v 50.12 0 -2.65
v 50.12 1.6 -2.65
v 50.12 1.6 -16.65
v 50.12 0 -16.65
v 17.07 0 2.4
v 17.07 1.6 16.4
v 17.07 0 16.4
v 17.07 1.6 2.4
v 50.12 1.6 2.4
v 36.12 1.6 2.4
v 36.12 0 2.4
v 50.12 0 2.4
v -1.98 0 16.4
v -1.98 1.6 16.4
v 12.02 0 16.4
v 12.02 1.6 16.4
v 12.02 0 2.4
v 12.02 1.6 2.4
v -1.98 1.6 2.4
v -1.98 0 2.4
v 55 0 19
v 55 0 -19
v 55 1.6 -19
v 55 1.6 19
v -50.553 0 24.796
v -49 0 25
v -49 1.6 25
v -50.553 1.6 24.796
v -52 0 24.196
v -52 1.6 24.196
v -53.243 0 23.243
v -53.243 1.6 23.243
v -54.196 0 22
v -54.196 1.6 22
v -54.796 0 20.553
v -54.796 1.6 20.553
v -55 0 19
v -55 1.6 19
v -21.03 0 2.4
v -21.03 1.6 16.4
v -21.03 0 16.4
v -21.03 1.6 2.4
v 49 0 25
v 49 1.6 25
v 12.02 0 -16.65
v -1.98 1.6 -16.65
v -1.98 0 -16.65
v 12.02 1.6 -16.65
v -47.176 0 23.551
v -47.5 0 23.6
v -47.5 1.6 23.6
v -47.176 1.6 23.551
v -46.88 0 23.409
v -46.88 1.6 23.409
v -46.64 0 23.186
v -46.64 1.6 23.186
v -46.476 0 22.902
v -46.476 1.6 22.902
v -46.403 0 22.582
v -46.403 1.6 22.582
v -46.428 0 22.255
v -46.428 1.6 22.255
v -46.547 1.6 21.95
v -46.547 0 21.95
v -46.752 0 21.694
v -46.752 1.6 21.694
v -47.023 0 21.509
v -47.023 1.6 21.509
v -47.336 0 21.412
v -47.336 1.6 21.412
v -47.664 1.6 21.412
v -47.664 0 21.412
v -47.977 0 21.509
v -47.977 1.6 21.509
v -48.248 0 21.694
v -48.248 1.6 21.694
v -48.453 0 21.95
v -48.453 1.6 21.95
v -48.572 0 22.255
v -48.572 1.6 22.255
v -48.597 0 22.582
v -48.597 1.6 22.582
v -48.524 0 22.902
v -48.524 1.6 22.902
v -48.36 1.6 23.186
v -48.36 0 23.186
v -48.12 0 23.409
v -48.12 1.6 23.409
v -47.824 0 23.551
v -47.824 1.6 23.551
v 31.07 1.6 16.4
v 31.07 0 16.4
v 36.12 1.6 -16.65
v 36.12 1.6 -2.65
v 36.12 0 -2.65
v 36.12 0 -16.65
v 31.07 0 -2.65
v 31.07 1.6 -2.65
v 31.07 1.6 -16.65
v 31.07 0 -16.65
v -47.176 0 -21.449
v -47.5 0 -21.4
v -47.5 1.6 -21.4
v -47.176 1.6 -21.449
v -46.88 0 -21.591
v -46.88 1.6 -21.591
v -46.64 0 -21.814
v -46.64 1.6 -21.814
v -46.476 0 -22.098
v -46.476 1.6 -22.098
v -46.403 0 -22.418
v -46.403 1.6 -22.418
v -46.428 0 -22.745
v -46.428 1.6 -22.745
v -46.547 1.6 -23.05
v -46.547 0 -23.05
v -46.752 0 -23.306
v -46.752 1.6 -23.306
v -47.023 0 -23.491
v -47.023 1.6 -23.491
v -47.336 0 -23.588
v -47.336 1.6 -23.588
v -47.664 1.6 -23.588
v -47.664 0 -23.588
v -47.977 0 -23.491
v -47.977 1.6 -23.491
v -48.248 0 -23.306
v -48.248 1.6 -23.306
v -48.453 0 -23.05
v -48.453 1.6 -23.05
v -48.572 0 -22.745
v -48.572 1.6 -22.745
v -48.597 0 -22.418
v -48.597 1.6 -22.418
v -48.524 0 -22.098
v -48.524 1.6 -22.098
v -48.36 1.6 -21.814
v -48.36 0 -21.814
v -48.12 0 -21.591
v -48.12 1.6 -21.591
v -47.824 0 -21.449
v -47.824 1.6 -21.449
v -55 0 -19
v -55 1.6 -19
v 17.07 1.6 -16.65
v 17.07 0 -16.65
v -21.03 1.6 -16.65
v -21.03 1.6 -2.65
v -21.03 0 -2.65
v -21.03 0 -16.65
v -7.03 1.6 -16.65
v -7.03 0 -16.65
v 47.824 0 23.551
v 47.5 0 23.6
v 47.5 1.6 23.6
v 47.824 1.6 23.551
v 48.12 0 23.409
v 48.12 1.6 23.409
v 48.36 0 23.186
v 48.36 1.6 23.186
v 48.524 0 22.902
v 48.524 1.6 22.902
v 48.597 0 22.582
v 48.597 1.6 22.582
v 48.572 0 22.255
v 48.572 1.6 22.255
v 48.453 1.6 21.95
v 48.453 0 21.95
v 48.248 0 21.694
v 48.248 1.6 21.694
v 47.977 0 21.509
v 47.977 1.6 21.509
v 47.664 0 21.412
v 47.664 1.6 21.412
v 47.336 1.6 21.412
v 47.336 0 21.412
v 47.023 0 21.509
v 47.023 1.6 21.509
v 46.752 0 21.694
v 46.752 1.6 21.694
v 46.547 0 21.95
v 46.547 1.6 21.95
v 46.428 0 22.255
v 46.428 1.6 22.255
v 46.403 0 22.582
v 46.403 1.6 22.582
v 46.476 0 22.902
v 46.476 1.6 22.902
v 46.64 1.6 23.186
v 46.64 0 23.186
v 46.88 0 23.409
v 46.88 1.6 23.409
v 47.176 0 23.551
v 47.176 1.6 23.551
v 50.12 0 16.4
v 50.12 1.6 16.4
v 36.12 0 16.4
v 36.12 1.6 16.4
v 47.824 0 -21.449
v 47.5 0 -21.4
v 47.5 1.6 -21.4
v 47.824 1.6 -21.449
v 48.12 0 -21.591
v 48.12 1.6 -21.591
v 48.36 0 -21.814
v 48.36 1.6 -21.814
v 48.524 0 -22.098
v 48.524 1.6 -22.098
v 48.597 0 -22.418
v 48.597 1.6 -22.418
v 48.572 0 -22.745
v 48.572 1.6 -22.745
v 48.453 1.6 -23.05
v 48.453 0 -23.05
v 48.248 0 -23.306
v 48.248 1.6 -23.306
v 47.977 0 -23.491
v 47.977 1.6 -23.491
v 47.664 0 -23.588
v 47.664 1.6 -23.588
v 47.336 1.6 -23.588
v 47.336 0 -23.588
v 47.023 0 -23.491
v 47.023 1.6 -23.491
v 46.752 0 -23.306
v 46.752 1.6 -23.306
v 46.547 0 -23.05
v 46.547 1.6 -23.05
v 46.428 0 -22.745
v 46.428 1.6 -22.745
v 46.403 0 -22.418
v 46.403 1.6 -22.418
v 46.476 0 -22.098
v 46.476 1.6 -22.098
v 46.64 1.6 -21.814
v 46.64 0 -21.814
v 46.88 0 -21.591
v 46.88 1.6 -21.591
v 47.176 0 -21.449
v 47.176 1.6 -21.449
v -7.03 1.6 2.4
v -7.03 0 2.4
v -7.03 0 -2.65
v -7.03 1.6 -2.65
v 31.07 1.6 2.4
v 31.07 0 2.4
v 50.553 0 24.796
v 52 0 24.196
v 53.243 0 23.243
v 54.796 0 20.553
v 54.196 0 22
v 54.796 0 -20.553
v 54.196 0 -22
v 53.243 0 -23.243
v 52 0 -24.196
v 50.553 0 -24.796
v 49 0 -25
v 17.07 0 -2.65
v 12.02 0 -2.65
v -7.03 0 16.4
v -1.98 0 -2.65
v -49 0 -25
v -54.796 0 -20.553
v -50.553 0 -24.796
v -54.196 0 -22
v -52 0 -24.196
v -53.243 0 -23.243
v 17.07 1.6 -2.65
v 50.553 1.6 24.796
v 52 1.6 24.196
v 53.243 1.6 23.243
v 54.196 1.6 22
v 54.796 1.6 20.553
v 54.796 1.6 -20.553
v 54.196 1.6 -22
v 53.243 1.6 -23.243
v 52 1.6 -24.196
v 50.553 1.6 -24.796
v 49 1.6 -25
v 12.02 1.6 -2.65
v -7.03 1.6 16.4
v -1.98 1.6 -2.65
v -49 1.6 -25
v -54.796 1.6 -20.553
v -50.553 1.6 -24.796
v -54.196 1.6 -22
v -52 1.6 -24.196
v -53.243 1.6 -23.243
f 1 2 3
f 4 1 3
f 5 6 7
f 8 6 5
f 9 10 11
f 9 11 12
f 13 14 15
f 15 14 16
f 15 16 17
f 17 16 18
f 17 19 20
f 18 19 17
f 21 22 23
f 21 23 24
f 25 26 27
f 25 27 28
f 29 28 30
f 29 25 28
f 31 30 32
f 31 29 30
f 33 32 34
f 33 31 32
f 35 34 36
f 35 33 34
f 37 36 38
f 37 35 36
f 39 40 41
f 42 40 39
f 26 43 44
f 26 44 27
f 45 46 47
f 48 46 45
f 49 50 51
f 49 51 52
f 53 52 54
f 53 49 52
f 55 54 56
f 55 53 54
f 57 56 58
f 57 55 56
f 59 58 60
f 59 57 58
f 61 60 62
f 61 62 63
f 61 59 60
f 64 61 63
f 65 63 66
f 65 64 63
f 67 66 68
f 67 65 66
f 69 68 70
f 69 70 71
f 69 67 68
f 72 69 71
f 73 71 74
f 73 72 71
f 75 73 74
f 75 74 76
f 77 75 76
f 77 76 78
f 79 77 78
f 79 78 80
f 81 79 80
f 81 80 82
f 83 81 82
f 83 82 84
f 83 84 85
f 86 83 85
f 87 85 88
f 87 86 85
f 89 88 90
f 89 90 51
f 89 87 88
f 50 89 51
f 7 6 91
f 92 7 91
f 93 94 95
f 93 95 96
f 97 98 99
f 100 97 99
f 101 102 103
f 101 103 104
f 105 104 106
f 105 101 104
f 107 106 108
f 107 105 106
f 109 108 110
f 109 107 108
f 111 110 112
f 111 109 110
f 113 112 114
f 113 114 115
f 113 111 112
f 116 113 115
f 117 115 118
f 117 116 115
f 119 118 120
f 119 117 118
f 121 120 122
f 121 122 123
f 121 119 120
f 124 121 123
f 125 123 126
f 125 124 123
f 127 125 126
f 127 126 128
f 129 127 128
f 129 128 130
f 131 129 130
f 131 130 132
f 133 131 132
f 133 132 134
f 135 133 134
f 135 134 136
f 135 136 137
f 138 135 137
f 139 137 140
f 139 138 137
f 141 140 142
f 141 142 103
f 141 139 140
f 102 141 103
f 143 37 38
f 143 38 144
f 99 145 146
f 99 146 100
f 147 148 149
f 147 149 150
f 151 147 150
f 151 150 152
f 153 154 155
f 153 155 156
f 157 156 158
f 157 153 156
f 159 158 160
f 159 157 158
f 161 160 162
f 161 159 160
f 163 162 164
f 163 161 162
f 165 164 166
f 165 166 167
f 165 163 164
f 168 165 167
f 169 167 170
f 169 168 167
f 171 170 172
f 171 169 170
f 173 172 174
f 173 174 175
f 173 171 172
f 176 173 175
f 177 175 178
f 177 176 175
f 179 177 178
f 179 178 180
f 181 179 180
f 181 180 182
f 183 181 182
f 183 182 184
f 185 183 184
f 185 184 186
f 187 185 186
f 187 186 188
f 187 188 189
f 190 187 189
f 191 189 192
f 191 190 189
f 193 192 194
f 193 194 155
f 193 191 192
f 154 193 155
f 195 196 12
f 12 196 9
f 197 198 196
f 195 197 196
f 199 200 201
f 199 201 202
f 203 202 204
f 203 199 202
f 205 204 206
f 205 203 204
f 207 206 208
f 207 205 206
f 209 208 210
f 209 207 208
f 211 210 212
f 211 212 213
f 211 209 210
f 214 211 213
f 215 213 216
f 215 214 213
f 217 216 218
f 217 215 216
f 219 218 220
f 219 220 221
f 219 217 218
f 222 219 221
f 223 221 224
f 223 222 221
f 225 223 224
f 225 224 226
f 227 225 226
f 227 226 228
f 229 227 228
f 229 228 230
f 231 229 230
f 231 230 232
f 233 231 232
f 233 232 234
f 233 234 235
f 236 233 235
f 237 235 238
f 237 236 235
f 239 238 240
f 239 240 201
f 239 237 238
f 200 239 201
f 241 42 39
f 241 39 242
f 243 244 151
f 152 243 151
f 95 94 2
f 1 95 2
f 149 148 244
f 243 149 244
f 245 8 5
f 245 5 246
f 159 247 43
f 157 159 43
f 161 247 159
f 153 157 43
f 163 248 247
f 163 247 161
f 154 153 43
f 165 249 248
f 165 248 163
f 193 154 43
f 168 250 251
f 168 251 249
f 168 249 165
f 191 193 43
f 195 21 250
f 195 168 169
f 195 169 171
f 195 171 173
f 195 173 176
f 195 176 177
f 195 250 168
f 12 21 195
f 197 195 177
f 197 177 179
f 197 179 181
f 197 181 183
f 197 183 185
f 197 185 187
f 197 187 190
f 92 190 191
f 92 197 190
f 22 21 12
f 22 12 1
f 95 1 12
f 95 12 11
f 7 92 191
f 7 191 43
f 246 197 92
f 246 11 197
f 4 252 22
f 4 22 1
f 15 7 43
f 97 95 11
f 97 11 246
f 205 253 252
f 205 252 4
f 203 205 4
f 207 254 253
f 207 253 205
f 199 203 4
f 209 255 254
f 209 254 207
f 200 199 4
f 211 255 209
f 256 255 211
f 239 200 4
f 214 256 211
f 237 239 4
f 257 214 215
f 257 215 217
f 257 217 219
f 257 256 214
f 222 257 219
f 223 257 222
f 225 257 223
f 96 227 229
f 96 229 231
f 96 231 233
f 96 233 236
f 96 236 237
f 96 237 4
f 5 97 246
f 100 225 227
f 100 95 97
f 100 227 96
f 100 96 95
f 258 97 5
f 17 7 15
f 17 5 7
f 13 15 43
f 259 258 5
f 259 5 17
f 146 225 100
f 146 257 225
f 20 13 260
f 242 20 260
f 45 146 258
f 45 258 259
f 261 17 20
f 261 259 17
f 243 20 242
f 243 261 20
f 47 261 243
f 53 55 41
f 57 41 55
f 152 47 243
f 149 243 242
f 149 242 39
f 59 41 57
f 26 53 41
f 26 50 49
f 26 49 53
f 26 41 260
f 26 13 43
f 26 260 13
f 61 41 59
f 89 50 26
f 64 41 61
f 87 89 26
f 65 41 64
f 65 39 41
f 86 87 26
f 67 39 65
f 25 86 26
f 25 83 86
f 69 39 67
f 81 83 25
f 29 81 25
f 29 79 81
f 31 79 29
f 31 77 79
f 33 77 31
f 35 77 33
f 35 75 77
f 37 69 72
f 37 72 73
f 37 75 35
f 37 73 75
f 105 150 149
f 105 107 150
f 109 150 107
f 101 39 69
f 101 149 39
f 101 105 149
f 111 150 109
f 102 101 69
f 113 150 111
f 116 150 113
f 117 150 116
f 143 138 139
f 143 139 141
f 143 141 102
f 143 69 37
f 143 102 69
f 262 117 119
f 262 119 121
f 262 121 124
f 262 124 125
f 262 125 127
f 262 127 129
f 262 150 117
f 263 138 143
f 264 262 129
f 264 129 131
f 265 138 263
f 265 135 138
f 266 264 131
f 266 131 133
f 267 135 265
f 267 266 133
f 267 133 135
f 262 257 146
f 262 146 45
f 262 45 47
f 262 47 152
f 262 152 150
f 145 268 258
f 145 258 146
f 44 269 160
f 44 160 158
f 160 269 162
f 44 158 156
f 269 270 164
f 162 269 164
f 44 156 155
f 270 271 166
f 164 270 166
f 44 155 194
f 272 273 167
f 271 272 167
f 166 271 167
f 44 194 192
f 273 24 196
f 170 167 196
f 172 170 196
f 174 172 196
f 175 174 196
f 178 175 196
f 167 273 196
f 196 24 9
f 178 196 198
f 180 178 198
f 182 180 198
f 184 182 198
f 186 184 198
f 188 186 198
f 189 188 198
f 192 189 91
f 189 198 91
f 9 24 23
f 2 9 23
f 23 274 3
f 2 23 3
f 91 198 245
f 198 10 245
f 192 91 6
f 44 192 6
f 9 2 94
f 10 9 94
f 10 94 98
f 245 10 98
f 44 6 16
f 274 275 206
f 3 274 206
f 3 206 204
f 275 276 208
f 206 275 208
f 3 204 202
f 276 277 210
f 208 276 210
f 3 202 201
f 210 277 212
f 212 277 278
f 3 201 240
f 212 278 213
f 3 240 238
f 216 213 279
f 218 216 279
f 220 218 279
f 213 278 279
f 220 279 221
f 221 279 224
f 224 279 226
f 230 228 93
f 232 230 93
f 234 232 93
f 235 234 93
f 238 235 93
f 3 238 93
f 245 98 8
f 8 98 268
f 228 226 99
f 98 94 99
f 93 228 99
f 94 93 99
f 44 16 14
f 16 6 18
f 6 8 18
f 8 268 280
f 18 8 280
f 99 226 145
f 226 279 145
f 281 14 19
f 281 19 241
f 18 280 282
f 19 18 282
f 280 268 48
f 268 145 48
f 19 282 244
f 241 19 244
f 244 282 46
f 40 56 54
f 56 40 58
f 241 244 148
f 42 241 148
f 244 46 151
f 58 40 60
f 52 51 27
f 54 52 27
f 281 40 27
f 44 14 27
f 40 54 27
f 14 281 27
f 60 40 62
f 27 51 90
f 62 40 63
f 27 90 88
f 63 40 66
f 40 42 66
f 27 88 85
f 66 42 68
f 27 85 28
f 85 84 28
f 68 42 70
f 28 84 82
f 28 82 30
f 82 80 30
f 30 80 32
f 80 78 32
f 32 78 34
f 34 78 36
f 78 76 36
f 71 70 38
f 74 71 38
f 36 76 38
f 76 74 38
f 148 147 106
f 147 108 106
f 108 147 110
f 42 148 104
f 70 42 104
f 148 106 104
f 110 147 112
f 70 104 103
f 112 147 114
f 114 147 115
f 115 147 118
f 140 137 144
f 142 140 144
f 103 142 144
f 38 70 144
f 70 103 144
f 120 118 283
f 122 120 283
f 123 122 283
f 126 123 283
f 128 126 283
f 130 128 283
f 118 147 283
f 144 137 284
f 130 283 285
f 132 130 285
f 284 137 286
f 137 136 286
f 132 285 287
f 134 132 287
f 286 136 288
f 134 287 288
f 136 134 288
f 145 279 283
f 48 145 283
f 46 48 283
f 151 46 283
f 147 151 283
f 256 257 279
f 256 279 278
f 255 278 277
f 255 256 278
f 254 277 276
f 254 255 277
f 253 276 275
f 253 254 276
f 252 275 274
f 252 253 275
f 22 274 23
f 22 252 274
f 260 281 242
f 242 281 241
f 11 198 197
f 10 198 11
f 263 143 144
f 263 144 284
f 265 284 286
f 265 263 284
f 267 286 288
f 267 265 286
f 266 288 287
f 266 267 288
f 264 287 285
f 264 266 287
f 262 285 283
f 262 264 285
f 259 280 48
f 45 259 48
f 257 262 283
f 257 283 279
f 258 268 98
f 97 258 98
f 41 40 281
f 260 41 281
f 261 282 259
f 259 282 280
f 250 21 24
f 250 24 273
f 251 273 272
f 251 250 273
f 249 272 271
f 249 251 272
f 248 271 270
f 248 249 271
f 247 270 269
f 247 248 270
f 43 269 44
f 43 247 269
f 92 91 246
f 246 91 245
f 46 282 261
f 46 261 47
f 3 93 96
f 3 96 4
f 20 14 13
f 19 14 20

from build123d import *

# Parameters (mm, degrees)
SKIZZE1_R                       = 1.1
AUFSATZ_LINEAR_AUSTRAGEN1_DEPTH = 1.6
SKIZZE2_W                       = 14
SKIZZE2_H                       = 14
SCHNITT_LINEAR_AUSTRAGEN1_DEPTH = 61.436412865


with BuildPart() as part:
    # Skizze1 → Aufsatz-Linear austragen1 (new body)
    with BuildSketch(Plane(origin=(0, 0, 0), x_dir=(1, 0, 0), z_dir=(0, 1, 0))):
        with BuildLine():
            Line((-49, 25), (49, 25))
            ThreePointArc((49, 25), (53.242640687, 23.242640687), (55, 19))
            Line((55, 19), (55, -19))
            ThreePointArc((55, -19), (53.242640687, -23.242640687), (49, -25))
            Line((49, -25), (-49, -25))
            ThreePointArc((-49, -25), (-53.242640687, -23.242640687), (-55, -19))
            Line((-55, -19), (-55, 19))
            ThreePointArc((-55, 19), (-53.242640687, 23.242640687), (-49, 25))
        make_face()
        with Locations(Location((47.5, 22.5, 0), (0, 0, 270))):
            Circle(SKIZZE1_R, mode=Mode.SUBTRACT)
        with Locations(Location((-47.5, 22.5, 0), (0, 0, 270))):
            Circle(SKIZZE1_R, mode=Mode.SUBTRACT)
        with Locations(Location((47.5, -22.5, 0), (0, 0, 270))):
            Circle(SKIZZE1_R, mode=Mode.SUBTRACT)
        with Locations(Location((-47.5, -22.5, 0), (0, 0, 270))):
            Circle(SKIZZE1_R, mode=Mode.SUBTRACT)
    extrude(amount=AUFSATZ_LINEAR_AUSTRAGEN1_DEPTH)

    # Skizze2 → Schnitt-Linear austragen1 (cut, through all)
    with BuildSketch(Plane(origin=(0, 1.6, 0), x_dir=(1, 0, 0), z_dir=(0, 1, 0))):
        with Locations((43.12, 9.65)):
            Rectangle(SKIZZE2_W, SKIZZE2_H)
        with Locations((43.12, -9.4)):
            Rectangle(SKIZZE2_W, SKIZZE2_H)
        with Locations((24.07, -9.4)):
            Rectangle(SKIZZE2_W, SKIZZE2_H)
        with Locations((5.02, -9.4)):
            Rectangle(SKIZZE2_W, SKIZZE2_H)
        with Locations((-14.03, -9.4)):
            Rectangle(SKIZZE2_W, SKIZZE2_H)
        with Locations((24.07, 9.65)):
            Rectangle(SKIZZE2_W, SKIZZE2_H)
        with Locations((5.02, 9.65)):
            Rectangle(SKIZZE2_W, SKIZZE2_H)
        with Locations((-14.03, 9.65)):
            Rectangle(SKIZZE2_W, SKIZZE2_H)
    extrude(amount=-SCHNITT_LINEAR_AUSTRAGEN1_DEPTH, mode=Mode.SUBTRACT)


solid = part.part
